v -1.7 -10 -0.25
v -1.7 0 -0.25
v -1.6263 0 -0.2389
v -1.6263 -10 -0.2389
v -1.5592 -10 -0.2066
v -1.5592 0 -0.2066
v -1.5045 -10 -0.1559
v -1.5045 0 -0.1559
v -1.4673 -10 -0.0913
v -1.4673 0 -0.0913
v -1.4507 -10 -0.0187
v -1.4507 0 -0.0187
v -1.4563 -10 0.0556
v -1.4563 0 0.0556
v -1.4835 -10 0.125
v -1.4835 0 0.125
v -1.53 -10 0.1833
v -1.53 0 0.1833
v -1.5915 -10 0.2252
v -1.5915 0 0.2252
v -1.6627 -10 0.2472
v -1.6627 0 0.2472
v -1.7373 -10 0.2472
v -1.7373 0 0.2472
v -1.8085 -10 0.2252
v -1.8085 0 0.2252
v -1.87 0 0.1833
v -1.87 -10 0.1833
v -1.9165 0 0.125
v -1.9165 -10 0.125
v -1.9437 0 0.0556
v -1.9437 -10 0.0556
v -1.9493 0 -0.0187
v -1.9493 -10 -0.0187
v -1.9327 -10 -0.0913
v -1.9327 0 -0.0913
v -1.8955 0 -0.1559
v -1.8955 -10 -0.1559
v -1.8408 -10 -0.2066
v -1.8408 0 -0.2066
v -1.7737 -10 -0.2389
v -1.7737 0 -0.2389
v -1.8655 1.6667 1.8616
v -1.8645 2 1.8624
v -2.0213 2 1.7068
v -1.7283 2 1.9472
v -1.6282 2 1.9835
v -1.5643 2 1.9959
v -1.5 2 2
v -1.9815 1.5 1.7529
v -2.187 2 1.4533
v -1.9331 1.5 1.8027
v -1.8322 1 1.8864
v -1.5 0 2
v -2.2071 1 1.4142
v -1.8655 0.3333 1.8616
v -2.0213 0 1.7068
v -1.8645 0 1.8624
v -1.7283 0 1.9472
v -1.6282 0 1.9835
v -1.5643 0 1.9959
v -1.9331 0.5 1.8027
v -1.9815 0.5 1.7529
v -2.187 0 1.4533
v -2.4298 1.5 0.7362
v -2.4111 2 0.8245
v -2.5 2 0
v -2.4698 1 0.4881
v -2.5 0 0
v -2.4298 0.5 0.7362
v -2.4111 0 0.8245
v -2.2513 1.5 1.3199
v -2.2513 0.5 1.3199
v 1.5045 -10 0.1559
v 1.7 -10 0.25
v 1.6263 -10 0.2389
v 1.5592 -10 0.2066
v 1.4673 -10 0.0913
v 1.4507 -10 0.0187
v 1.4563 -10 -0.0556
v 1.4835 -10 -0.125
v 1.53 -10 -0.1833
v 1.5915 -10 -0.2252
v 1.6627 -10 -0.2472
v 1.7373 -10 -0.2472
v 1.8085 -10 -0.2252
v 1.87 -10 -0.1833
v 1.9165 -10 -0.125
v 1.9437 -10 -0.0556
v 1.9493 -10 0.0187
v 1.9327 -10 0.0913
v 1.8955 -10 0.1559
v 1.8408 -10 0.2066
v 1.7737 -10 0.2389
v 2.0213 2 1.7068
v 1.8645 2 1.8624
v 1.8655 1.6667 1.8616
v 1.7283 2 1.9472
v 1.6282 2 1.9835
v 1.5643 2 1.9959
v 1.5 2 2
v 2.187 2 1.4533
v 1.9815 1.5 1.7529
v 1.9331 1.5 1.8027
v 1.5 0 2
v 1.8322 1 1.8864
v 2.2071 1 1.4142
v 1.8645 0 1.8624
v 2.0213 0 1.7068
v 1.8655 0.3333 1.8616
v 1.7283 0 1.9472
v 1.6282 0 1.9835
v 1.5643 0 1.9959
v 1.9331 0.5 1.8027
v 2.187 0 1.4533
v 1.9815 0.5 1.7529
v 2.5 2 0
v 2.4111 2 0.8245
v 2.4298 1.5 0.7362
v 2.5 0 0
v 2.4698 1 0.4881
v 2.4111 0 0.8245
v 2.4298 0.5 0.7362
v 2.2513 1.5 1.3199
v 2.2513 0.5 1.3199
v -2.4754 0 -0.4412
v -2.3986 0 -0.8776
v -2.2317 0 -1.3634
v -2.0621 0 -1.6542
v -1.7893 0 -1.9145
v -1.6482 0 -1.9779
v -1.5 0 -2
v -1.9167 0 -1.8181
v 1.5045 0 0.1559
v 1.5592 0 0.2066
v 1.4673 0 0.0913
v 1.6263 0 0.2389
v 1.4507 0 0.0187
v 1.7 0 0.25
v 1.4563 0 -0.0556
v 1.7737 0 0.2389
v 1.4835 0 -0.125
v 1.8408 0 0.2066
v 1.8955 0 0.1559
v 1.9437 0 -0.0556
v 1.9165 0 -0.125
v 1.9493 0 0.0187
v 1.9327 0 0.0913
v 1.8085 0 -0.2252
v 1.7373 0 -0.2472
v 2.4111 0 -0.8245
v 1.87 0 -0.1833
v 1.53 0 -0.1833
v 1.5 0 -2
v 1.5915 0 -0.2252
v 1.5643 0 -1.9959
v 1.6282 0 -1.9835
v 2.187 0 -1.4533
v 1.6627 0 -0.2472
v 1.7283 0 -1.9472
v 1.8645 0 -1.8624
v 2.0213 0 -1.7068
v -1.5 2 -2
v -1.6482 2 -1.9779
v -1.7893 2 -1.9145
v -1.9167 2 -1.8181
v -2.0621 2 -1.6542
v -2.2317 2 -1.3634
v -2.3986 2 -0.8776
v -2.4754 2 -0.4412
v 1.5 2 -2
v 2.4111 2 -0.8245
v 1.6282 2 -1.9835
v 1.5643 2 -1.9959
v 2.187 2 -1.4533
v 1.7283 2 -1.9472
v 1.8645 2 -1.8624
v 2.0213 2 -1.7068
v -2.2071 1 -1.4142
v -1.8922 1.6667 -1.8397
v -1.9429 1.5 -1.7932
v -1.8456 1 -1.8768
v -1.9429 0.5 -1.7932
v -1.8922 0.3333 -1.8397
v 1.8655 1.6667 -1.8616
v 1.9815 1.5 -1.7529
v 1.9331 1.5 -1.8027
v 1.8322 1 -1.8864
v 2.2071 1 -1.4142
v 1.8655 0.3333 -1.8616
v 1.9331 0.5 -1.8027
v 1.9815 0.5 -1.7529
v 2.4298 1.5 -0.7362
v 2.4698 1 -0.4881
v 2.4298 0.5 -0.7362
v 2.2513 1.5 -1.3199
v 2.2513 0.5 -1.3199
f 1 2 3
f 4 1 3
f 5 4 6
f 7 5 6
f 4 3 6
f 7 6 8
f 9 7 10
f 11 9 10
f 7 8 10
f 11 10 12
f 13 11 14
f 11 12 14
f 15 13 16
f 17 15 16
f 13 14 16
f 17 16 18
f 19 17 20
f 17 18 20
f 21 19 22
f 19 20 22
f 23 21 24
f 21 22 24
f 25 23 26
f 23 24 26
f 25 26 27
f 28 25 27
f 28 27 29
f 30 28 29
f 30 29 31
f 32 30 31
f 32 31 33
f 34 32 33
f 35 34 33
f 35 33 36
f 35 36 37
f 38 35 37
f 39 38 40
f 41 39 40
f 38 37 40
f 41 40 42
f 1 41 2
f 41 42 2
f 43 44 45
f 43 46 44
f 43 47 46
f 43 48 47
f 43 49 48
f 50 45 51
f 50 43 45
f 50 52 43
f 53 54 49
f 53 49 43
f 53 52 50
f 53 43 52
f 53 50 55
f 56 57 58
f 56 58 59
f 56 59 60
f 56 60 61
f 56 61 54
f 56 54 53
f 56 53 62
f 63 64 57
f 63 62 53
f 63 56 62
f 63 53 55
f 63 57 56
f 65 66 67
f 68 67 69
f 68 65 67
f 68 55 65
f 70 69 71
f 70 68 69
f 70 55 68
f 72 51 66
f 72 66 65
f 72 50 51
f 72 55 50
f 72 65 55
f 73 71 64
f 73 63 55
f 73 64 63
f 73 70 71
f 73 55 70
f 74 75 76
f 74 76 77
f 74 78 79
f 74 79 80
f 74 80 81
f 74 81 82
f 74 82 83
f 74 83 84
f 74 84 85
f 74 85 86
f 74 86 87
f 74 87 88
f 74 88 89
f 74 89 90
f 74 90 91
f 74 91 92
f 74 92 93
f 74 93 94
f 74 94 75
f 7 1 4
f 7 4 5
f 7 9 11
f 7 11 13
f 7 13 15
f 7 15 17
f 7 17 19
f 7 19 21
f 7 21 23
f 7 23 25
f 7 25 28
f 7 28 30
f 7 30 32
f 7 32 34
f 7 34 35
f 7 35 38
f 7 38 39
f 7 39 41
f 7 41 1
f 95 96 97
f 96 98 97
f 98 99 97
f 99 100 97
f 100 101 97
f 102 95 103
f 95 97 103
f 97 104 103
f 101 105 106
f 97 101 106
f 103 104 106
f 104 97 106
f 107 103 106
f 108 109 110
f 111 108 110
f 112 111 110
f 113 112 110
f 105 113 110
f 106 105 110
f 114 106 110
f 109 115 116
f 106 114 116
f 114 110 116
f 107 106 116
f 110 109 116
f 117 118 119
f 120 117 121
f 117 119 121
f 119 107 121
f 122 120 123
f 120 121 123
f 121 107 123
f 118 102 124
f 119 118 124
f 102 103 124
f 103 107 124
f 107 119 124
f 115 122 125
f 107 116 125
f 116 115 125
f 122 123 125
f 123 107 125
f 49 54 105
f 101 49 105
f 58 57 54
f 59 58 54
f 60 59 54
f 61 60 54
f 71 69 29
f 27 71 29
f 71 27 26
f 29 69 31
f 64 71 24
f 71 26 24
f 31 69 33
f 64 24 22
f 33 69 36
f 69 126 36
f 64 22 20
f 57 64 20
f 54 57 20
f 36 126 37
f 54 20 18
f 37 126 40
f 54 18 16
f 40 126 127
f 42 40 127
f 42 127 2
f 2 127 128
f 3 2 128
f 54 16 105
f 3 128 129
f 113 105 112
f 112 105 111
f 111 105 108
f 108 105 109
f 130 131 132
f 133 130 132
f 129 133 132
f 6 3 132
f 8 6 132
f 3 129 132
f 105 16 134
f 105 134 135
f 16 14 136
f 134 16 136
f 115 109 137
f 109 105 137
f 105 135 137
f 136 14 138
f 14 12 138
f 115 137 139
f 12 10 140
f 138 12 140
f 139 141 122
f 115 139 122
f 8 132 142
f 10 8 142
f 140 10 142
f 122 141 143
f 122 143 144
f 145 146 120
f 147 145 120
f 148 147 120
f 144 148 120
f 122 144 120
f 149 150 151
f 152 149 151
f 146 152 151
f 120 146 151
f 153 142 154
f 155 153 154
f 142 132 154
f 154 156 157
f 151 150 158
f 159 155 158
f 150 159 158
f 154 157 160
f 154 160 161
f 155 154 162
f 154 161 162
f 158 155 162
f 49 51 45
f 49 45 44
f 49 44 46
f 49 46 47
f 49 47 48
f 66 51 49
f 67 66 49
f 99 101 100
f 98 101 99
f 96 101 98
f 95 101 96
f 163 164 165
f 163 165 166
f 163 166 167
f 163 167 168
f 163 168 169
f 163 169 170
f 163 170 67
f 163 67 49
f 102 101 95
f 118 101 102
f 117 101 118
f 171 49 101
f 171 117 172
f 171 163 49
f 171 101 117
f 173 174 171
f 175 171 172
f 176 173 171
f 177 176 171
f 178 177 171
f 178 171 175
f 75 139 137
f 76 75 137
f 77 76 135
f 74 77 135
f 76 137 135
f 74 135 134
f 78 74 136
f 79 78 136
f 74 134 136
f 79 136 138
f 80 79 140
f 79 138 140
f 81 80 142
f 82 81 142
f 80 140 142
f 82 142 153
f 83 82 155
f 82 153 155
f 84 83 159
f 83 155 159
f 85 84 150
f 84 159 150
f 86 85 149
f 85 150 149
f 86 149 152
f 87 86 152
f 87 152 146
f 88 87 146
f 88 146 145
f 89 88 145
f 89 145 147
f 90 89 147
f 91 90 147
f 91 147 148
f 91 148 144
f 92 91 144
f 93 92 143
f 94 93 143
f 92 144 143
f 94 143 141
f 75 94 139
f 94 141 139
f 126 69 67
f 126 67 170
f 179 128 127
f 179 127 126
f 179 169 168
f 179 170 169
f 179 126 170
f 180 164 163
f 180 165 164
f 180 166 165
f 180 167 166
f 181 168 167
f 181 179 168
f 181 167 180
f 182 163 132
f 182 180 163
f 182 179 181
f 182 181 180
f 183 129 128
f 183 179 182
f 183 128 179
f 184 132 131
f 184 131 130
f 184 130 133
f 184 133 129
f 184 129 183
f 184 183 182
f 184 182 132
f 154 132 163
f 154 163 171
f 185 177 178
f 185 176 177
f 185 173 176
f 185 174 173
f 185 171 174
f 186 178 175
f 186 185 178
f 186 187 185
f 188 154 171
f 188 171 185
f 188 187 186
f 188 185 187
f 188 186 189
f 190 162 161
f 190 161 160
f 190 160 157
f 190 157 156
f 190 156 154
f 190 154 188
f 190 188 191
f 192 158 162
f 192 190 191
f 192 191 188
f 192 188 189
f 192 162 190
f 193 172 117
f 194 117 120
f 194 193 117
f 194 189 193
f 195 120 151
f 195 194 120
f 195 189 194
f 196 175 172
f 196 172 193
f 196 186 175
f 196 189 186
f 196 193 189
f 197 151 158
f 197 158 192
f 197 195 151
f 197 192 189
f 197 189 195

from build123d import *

# Parameters (mm, degrees)
SKETCH1_W           = 5
SKETCH1_H           = 4
BOSS_EXTRUDE1_DEPTH = 2
SKETCH2_R           = 0.25
BOSS_EXTRUDE2_DEPTH = 10
FILLET1_SIZE        = 2
FILLET1_SIZE_2      = 1
FILLET2_SIZE        = 1
FILLET2_SIZE_2      = 2


with BuildPart() as part:
    # Sketch1 → Boss-Extrude1 (new body)
    with BuildSketch(Plane(origin=(0, 0, 0), x_dir=(1, 0, 0), z_dir=(0, 1, 0))):
        Rectangle(SKETCH1_W, SKETCH1_H)
    extrude(amount=BOSS_EXTRUDE1_DEPTH)

    # Sketch2 → Boss-Extrude2 (add)
    with BuildSketch(Plane.XZ):
        with Locations(Location((-1.7, 0, 0), (0, 0, 270))):
            Circle(SKETCH2_R)
        with Locations(Location((1.7, 0, 0), (0, 0, 90))):
            Circle(SKETCH2_R)
    extrude(amount=BOSS_EXTRUDE2_DEPTH)

    # Fillet1
    # an asymmetric fillet: 2, 1 mm, written as the material it takes off along each edge
    with BuildSketch(Plane(origin=(-2.5, -5, -2), x_dir=(0, 0, 1), z_dir=(0, 1, 0))) as fillet1_piece_1:
        with BuildLine():
            Bezier((FILLET1_SIZE, 0), (0, 0), (0, FILLET1_SIZE_2), weights=[1, 0.707106781, 1])
            Line((0, FILLET1_SIZE_2), (0, 0))
            Line((0, 0), (FILLET1_SIZE, 0))
        make_face()
    extrude(amount=12, mode=Mode.SUBTRACT)
    with BuildSketch(Plane(origin=(2.5, -5, 2), x_dir=(-1, 0, 0), z_dir=(0, 1, 0))) as fillet1_piece_2:
        with BuildLine():
            Bezier((FILLET1_SIZE_2, 0), (0, 0), (0, -FILLET1_SIZE), weights=[1, 0.707106781, 1])
            Line((0, -FILLET1_SIZE), (0, 0))
            Line((0, 0), (FILLET1_SIZE_2, 0))
        make_face()
    extrude(amount=12, mode=Mode.SUBTRACT)

    # Fillet2
    # an asymmetric fillet: 2, 1 mm, written as the material it takes off along each edge
    with BuildSketch(Plane(origin=(-2.5, -5, 2), x_dir=(1, 0, 0), z_dir=(0, 1, 0)), Plane(origin=(2.5, -5, -2), x_dir=(-1, 0, 0), z_dir=(0, 1, 0))) as fillet2_piece_1:
        with BuildLine():
            Bezier((FILLET2_SIZE, 0), (0, 0), (0, FILLET2_SIZE_2), weights=[1, 0.707106781, 1])
            Line((0, FILLET2_SIZE_2), (0, 0))
            Line((0, 0), (FILLET2_SIZE, 0))
        make_face()
    extrude(amount=12, mode=Mode.SUBTRACT)


solid = part.part
